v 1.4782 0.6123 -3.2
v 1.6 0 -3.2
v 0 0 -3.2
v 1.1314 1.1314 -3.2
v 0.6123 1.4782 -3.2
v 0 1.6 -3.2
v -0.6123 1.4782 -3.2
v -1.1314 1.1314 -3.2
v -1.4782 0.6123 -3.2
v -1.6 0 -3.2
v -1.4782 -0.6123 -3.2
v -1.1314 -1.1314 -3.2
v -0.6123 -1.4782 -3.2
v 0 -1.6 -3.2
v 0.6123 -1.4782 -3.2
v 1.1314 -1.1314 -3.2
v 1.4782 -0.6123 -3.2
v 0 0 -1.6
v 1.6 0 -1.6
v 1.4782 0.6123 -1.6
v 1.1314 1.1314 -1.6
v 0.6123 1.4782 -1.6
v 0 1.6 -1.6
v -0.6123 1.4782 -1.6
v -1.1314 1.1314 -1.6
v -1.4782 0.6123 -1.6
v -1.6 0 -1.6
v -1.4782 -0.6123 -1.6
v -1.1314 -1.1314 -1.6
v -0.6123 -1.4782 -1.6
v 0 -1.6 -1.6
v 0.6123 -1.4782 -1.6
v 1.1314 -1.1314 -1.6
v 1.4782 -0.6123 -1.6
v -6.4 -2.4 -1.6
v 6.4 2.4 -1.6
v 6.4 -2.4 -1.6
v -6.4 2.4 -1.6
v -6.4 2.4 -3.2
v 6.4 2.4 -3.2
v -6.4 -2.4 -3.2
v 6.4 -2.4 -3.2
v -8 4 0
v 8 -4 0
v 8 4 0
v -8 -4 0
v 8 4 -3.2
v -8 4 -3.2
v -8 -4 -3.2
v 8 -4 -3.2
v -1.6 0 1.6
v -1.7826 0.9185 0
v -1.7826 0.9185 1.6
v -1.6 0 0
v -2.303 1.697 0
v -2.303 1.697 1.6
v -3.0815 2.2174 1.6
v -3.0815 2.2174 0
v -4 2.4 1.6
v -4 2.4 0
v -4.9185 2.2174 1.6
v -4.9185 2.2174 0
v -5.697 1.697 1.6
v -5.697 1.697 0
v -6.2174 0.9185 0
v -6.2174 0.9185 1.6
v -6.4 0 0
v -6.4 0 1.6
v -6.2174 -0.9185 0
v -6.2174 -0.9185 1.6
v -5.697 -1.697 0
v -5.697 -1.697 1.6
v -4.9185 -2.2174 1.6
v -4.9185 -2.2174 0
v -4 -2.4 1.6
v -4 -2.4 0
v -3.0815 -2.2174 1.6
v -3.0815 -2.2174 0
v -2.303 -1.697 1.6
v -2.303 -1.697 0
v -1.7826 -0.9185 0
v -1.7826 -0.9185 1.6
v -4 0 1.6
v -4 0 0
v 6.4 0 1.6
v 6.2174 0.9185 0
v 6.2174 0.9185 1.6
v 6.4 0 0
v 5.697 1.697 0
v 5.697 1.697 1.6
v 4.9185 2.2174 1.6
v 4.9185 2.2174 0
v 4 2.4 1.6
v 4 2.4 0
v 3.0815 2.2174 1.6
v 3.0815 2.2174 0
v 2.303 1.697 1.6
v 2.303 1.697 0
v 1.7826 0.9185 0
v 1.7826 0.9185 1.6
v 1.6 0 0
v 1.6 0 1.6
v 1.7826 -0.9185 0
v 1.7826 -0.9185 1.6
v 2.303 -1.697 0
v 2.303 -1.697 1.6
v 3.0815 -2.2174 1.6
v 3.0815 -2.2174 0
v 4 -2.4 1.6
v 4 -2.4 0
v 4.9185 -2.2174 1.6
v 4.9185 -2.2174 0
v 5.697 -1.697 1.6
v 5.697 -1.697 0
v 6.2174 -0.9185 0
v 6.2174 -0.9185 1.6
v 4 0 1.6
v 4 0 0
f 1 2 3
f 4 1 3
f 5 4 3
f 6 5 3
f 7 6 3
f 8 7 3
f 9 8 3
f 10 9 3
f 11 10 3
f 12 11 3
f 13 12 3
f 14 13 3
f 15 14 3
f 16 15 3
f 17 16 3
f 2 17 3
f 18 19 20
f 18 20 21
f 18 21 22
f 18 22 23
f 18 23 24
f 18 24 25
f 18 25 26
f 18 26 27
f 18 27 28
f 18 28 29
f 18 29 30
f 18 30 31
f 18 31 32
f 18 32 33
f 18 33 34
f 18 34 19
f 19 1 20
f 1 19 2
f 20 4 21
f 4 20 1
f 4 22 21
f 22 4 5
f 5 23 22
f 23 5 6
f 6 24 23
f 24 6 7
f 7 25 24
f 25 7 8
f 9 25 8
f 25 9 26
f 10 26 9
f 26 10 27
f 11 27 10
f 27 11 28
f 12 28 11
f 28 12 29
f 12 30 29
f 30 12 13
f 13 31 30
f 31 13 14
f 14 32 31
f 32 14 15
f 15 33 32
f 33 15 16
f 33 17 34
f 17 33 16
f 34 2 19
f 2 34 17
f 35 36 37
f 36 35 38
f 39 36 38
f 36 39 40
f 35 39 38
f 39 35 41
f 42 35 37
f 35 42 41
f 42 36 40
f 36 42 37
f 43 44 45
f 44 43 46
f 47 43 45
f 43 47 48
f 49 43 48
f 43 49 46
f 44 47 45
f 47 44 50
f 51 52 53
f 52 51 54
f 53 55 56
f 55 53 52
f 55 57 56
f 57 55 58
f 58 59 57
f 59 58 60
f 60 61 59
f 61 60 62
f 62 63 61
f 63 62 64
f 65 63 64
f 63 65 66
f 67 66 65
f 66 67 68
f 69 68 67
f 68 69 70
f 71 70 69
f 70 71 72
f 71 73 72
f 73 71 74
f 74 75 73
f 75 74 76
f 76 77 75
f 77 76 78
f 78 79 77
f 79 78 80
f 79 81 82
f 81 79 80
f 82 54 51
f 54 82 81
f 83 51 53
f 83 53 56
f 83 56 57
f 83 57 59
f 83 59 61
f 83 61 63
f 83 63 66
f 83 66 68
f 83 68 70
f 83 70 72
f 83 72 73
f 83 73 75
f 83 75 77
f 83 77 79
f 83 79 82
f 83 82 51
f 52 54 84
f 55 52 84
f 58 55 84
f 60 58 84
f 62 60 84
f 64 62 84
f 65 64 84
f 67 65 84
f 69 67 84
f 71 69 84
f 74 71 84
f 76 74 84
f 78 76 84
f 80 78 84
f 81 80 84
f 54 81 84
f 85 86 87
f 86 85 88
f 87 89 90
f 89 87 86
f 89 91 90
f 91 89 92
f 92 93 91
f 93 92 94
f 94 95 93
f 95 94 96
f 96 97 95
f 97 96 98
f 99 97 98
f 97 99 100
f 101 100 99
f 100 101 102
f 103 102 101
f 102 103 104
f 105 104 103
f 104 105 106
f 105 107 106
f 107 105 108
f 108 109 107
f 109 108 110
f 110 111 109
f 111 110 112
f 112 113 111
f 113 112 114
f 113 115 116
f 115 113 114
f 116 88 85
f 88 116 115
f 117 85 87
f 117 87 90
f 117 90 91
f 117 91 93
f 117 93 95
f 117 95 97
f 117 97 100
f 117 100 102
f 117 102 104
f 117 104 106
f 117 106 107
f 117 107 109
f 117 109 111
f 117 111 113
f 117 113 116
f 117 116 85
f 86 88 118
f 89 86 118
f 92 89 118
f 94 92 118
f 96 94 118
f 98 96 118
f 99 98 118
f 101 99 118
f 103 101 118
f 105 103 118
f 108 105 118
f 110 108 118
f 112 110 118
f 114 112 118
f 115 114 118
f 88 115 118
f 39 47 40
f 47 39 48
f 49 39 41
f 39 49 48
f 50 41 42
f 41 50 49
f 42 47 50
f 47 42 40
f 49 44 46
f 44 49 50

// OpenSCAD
// file: ../p/stud.scad
use <../lib.scad>
use <4-4cyli.scad>
use <4-4disc.scad>
use <4-4edge.scad>
function ldraw_lib__stud() = [
// 0 Stud
// 0 Name: stud.dat
// 0 Author: James Jessiman
// 0 !LDRAW_ORG Primitive UPDATE 2012-01
// 0 !LICENSE Licensed under CC BY 4.0 : see CAreadme.txt
// 
// 0 BFC CERTIFY CCW
  [0,"BFC","CERTIFY"],
  [0,"BFC","CCW"],
// 
// 0 !HISTORY 2002-04-04 [sbliss] Modified for BFC compliance
// 0 !HISTORY 2002-04-25 [PTadmin] Official Update 2002-02
// 0 !HISTORY 2007-06-24 [PTadmin] Header formatted for Contributor Agreement
// 0 !HISTORY 2008-07-01 [PTadmin] Official Update 2008-01
// 0 !HISTORY 2012-02-16 [Philo] Changed to CCW
// 0 !HISTORY 2012-03-30 [PTadmin] Official Update 2012-01
// 
// 
// 1 16 0 0 0 6 0 0 0 1 0 0 0 6 4-4edge.dat
  [1,16,0,0,0,6,0,0,0,1,0,0,0,6, ldraw_lib__4_4edge()],
// 1 16 0 -4 0 6 0 0 0 1 0 0 0 6 4-4edge.dat
  [1,16,0,-4,0,6,0,0,0,1,0,0,0,6, ldraw_lib__4_4edge()],
// 1 16 0 0 0 6 0 0 0 -4 0 0 0 6 4-4cyli.dat
  [1,16,0,0,0,6,0,0,0,-4,0,0,0,6, ldraw_lib__4_4cyli()],
// 1 16 0 -4 0 6 0 0 0 1 0 0 0 6 4-4disc.dat
  [1,16,0,-4,0,6,0,0,0,1,0,0,0,6, ldraw_lib__4_4disc()],
  [-1,16,0,0,0,6,0,0,0,-1,0,0,0,6, ldraw_lib__4_4disc()],
];
module ldraw_lib__stud(step=0, col=false, unit=2/5, alt=false, line=0.2, solid=!$preview)
    makepoly(ldraw_lib__stud(), step=step, col=col, unit=unit, alt=alt, line=line, solid=solid);
ldraw_lib__stud(line=0.2);
// file: ../p/4-4edge.scad
use <../lib.scad>
function ldraw_lib__4_4edge() = [
// 0 Circle 1.0
// 0 Name: 4-4edge.dat
// 0 Author: James Jessiman
// 0 !LDRAW_ORG Primitive UPDATE 2017-01
// 0 !LICENSE Licensed under CC BY 2.0 and CC BY 4.0 : see CAreadme.txt
// 
// 0 BFC CERTIFY CCW
  [0,"BFC","CERTIFY"],
  [0,"BFC","CCW"],
// 
// 0 !HISTORY 1998-12-15 [PTadmin] Official Update 1998-10
// 0 !HISTORY 2005-12-28 [PTadmin] Official Update 2005-01
// 0 !HISTORY 2007-06-24 [PTadmin] Header formatted for Contributor Agreement
// 0 !HISTORY 2008-07-01 [PTadmin] Official Update 2008-01
// 0 !HISTORY 2017-01-15 [Steffen] BFCed
// 0 !HISTORY 2017-12-30 [PTadmin] Official Update 2017-01
// 
// 
// 2 24 1 0 0 0.9239 0 0.3827
  [2,24,1,0,0,0.9239,0,0.3827],
// 2 24 0.9239 0 0.3827 0.7071 0 0.7071
  [2,24,0.9239,0,0.3827,0.7071,0,0.7071],
// 2 24 0.7071 0 0.7071 0.3827 0 0.9239
  [2,24,0.7071,0,0.7071,0.3827,0,0.9239],
// 2 24 0.3827 0 0.9239 0 0 1
  [2,24,0.3827,0,0.9239,0,0,1],
// 2 24 0 0 1 -0.3827 0 0.9239
  [2,24,0,0,1,-0.3827,0,0.9239],
// 2 24 -0.3827 0 0.9239 -0.7071 0 0.7071
  [2,24,-0.3827,0,0.9239,-0.7071,0,0.7071],
// 2 24 -0.7071 0 0.7071 -0.9239 0 0.3827
  [2,24,-0.7071,0,0.7071,-0.9239,0,0.3827],
// 2 24 -0.9239 0 0.3827 -1 0 -0
  [2,24,-0.9239,0,0.3827,-1,0,-0],
// 2 24 -1 0 -0 -0.9239 0 -0.3827
  [2,24,-1,0,-0,-0.9239,0,-0.3827],
// 2 24 -0.9239 0 -0.3827 -0.7071 0 -0.7071
  [2,24,-0.9239,0,-0.3827,-0.7071,0,-0.7071],
// 2 24 -0.7071 0 -0.7071 -0.3827 0 -0.9239
  [2,24,-0.7071,0,-0.7071,-0.3827,0,-0.9239],
// 2 24 -0.3827 0 -0.9239 0 0 -1
  [2,24,-0.3827,0,-0.9239,0,0,-1],
// 2 24 0 0 -1 0.3827 0 -0.9239
  [2,24,0,0,-1,0.3827,0,-0.9239],
// 2 24 0.3827 0 -0.9239 0.7071 0 -0.7071
  [2,24,0.3827,0,-0.9239,0.7071,0,-0.7071],
// 2 24 0.7071 0 -0.7071 0.9239 0 -0.3827
  [2,24,0.7071,0,-0.7071,0.9239,0,-0.3827],
// 2 24 0.9239 0 -0.3827 1 0 0
  [2,24,0.9239,0,-0.3827,1,0,0],
];
module ldraw_lib__4_4edge(step=0, col=false, unit=2/5, alt=false, line=0.2, solid=!$preview)
    makepoly(ldraw_lib__4_4edge(), step=step, col=col, unit=unit, alt=alt, line=line, solid=solid);
ldraw_lib__4_4edge(line=0.2);
// file: ../p/4-4disc.scad
use <../lib.scad>
function ldraw_lib__4_4disc() = [
// 0 Disc 1.0
// 0 Name: 4-4disc.dat
// 0 Author: James Jessiman
// 0 !LDRAW_ORG Primitive UPDATE 2002-02
// 0 !LICENSE Licensed under CC BY 2.0 and CC BY 4.0 : see CAreadme.txt
// 
// 0 BFC CERTIFY CCW
  [0,"BFC","CERTIFY"],
  [0,"BFC","CCW"],
// 
// 0 !HISTORY 1998-12-15 [PTadmin] Official Update 1998-10
// 0 !HISTORY 2002-03-23 [sbliss] Added BFC statement
// 0 !HISTORY 2002-04-25 [PTadmin] Official Update 2002-02
// 0 !HISTORY 2007-06-24 [PTadmin] Header formatted for Contributor Agreement
// 0 !HISTORY 2008-07-01 [PTadmin] Official Update 2008-01
// 
// 
// 3 16 0 0 0 1 0 0 0.9239 0 0.3827
  [3,16,0,0,0,1,0,0,0.9239,0,0.3827],
// 3 16 0 0 0 0.9239 0 0.3827 0.7071 0 0.7071
  [3,16,0,0,0,0.9239,0,0.3827,0.7071,0,0.7071],
// 3 16 0 0 0 0.7071 0 0.7071 0.3827 0 0.9239
  [3,16,0,0,0,0.7071,0,0.7071,0.3827,0,0.9239],
// 3 16 0 0 0 0.3827 0 0.9239 0 0 1
  [3,16,0,0,0,0.3827,0,0.9239,0,0,1],
// 3 16 0 0 0 0 0 1 -0.3827 0 0.9239
  [3,16,0,0,0,0,0,1,-0.3827,0,0.9239],
// 3 16 0 0 0 -0.3827 0 0.9239 -0.7071 0 0.7071
  [3,16,0,0,0,-0.3827,0,0.9239,-0.7071,0,0.7071],
// 3 16 0 0 0 -0.7071 0 0.7071 -0.9239 0 0.3827
  [3,16,0,0,0,-0.7071,0,0.7071,-0.9239,0,0.3827],
// 3 16 0 0 0 -0.9239 0 0.3827 -1 0 -0
  [3,16,0,0,0,-0.9239,0,0.3827,-1,0,-0],
// 3 16 0 0 0 -1 0 -0 -0.9239 0 -0.3827
  [3,16,0,0,0,-1,0,-0,-0.9239,0,-0.3827],
// 3 16 0 0 0 -0.9239 0 -0.3827 -0.7071 0 -0.7071
  [3,16,0,0,0,-0.9239,0,-0.3827,-0.7071,0,-0.7071],
// 3 16 0 0 0 -0.7071 0 -0.7071 -0.3827 0 -0.9239
  [3,16,0,0,0,-0.7071,0,-0.7071,-0.3827,0,-0.9239],
// 3 16 0 0 0 -0.3827 0 -0.9239 0 0 -1
  [3,16,0,0,0,-0.3827,0,-0.9239,0,0,-1],
// 3 16 0 0 0 0 0 -1 0.3827 0 -0.9239
  [3,16,0,0,0,0,0,-1,0.3827,0,-0.9239],
// 3 16 0 0 0 0.3827 0 -0.9239 0.7071 0 -0.7071
  [3,16,0,0,0,0.3827,0,-0.9239,0.7071,0,-0.7071],
// 3 16 0 0 0 0.7071 0 -0.7071 0.9239 0 -0.3827
  [3,16,0,0,0,0.7071,0,-0.7071,0.9239,0,-0.3827],
// 3 16 0 0 0 0.9239 0 -0.3827 1 0 0
  [3,16,0,0,0,0.9239,0,-0.3827,1,0,0],
// 0
];
module ldraw_lib__4_4disc(step=0, col=false, unit=2/5, alt=false, line=0.2, solid=!$preview)
    makepoly(ldraw_lib__4_4disc(), step=step, col=col, unit=unit, alt=alt, line=line, solid=solid);
ldraw_lib__4_4disc(line=0.2);
// file: ../p/4-4cyli.scad
use <../lib.scad>
$fa=1; $fs=0.2;
function ldraw_lib__4_4cyli(realsolid=false) = [
// 0 Cylinder 1.0
// 0 Name: 4-4cyli.dat
// 0 Author: James Jessiman
// 0 !LDRAW_ORG Primitive UPDATE 2005-01
// 0 !LICENSE Licensed under CC BY 2.0 and CC BY 4.0 : see CAreadme.txt
// 
// 0 BFC CERTIFY CCW
  [0,"BFC","CERTIFY"],
  [0,"BFC","CCW"],
// 
// 0 !HISTORY 1998-12-15 [PTadmin] Official Update 1998-10
// 0 !HISTORY 2002-03-23 [sbliss] Added BFC statement; merged headers from files in distributions LDraw 0.27 and Complete.
// 0 !HISTORY 2002-04-25 [PTadmin] Official Update 2002-02
// 0 !HISTORY 2004-12-14 [guyvivan] BFC CCW
// 0 !HISTORY 2005-12-28 [PTadmin] Official Update 2005-01
// 0 !HISTORY 2007-06-24 [PTadmin] Header formatted for Contributor Agreement
// 0 !HISTORY 2008-07-01 [PTadmin] Official Update 2008-01
// 
// 
// 4 16 1 1 0 0.9239 1 0.3827 0.9239 0 0.3827 1 0 0
  [4,16,1,1,0,0.9239,1,0.3827,0.9239,0,0.3827,1,0,0],
// 5 24 1 0 0 1 1 0 0.9239 0 0.3827 0.9239 0 -0.3827
  [5,24,1,0,0,1,1,0,0.9239,0,0.3827,0.9239,0,-0.3827],
// 4 16 0.9239 1 0.3827 0.7071 1 0.7071 0.7071 0 0.7071 0.9239 0 0.3827
  [4,16,0.9239,1,0.3827,0.7071,1,0.7071,0.7071,0,0.7071,0.9239,0,0.3827],
// 5 24 0.9239 0 0.3827 0.9239 1 0.3827 0.7071 0 0.7071 1 0 0
  [5,24,0.9239,0,0.3827,0.9239,1,0.3827,0.7071,0,0.7071,1,0,0],
// 4 16 0.7071 1 0.7071 0.3827 1 0.9239 0.3827 0 0.9239 0.7071 0 0.7071
  [4,16,0.7071,1,0.7071,0.3827,1,0.9239,0.3827,0,0.9239,0.7071,0,0.7071],
// 5 24 0.7071 0 0.7071 0.7071 1 0.7071 0.3827 0 0.9239 0.9239 0 0.3827
  [5,24,0.7071,0,0.7071,0.7071,1,0.7071,0.3827,0,0.9239,0.9239,0,0.3827],
// 4 16 0.3827 1 0.9239 0 1 1 0 0 1 0.3827 0 0.9239
  [4,16,0.3827,1,0.9239,0,1,1,0,0,1,0.3827,0,0.9239],
// 5 24 0.3827 0 0.9239 0.3827 1 0.9239 0 0 1 0.7071 0 0.7071
  [5,24,0.3827,0,0.9239,0.3827,1,0.9239,0,0,1,0.7071,0,0.7071],
// 4 16 0 1 1 -0.3827 1 0.9239 -0.3827 0 0.9239 0 0 1
  [4,16,0,1,1,-0.3827,1,0.9239,-0.3827,0,0.9239,0,0,1],
// 5 24 0 0 1 0 1 1 -0.3827 0 0.9239 0.3827 0 0.9239
  [5,24,0,0,1,0,1,1,-0.3827,0,0.9239,0.3827,0,0.9239],
// 4 16 -0.3827 1 0.9239 -0.7071 1 0.7071 -0.7071 0 0.7071 -0.3827 0 0.9239
  [4,16,-0.3827,1,0.9239,-0.7071,1,0.7071,-0.7071,0,0.7071,-0.3827,0,0.9239],
// 5 24 -0.3827 0 0.9239 -0.3827 1 0.9239 -0.7071 0 0.7071 0 0 1
  [5,24,-0.3827,0,0.9239,-0.3827,1,0.9239,-0.7071,0,0.7071,0,0,1],
// 4 16 -0.7071 1 0.7071 -0.9239 1 0.3827 -0.9239 0 0.3827 -0.7071 0 0.7071
  [4,16,-0.7071,1,0.7071,-0.9239,1,0.3827,-0.9239,0,0.3827,-0.7071,0,0.7071],
// 5 24 -0.7071 0 0.7071 -0.7071 1 0.7071 -0.9239 0 0.3827 -0.3827 0 0.9239
  [5,24,-0.7071,0,0.7071,-0.7071,1,0.7071,-0.9239,0,0.3827,-0.3827,0,0.9239],
// 4 16 -0.9239 1 0.3827 -1 1 0 -1 0 0 -0.9239 0 0.3827
  [4,16,-0.9239,1,0.3827,-1,1,0,-1,0,0,-0.9239,0,0.3827],
// 5 24 -0.9239 0 0.3827 -0.9239 1 0.3827 -1 0 0 -0.7071 0 0.7071
  [5,24,-0.9239,0,0.3827,-0.9239,1,0.3827,-1,0,0,-0.7071,0,0.7071],
// 4 16 -1 1 0 -0.9239 1 -0.3827 -0.9239 0 -0.3827 -1 0 0
  [4,16,-1,1,0,-0.9239,1,-0.3827,-0.9239,0,-0.3827,-1,0,0],
// 5 24 -1 0 0 -1 1 0 -0.9239 0 -0.3827 -0.9239 0 0.3827
  [5,24,-1,0,0,-1,1,0,-0.9239,0,-0.3827,-0.9239,0,0.3827],
// 4 16 -0.9239 1 -0.3827 -0.7071 1 -0.7071 -0.7071 0 -0.7071 -0.9239 0 -0.3827
  [4,16,-0.9239,1,-0.3827,-0.7071,1,-0.7071,-0.7071,0,-0.7071,-0.9239,0,-0.3827],
// 5 24 -0.9239 0 -0.3827 -0.9239 1 -0.3827 -0.7071 0 -0.7071 -1 0 0
  [5,24,-0.9239,0,-0.3827,-0.9239,1,-0.3827,-0.7071,0,-0.7071,-1,0,0],
// 4 16 -0.7071 1 -0.7071 -0.3827 1 -0.9239 -0.3827 0 -0.9239 -0.7071 0 -0.7071
  [4,16,-0.7071,1,-0.7071,-0.3827,1,-0.9239,-0.3827,0,-0.9239,-0.7071,0,-0.7071],
// 5 24 -0.7071 0 -0.7071 -0.7071 1 -0.7071 -0.3827 0 -0.9239 -0.9239 0 -0.3827
  [5,24,-0.7071,0,-0.7071,-0.7071,1,-0.7071,-0.3827,0,-0.9239,-0.9239,0,-0.3827],
// 4 16 -0.3827 1 -0.9239 0 1 -1 0 0 -1 -0.3827 0 -0.9239
  [4,16,-0.3827,1,-0.9239,0,1,-1,0,0,-1,-0.3827,0,-0.9239],
// 5 24 -0.3827 0 -0.9239 -0.3827 1 -0.9239 0 0 -1 -0.7071 0 -0.7071
  [5,24,-0.3827,0,-0.9239,-0.3827,1,-0.9239,0,0,-1,-0.7071,0,-0.7071],
// 4 16 0 1 -1 0.3827 1 -0.9239 0.3827 0 -0.9239 0 0 -1
  [4,16,0,1,-1,0.3827,1,-0.9239,0.3827,0,-0.9239,0,0,-1],
// 5 24 0 0 -1 0 1 -1 0.3827 0 -0.9239 -0.3827 0 -0.9239
  [5,24,0,0,-1,0,1,-1,0.3827,0,-0.9239,-0.3827,0,-0.9239],
// 4 16 0.3827 1 -0.9239 0.7071 1 -0.7071 0.7071 0 -0.7071 0.3827 0 -0.9239
  [4,16,0.3827,1,-0.9239,0.7071,1,-0.7071,0.7071,0,-0.7071,0.3827,0,-0.9239],
// 5 24 0.3827 0 -0.9239 0.3827 1 -0.9239 0.7071 0 -0.7071 0 0 -1
  [5,24,0.3827,0,-0.9239,0.3827,1,-0.9239,0.7071,0,-0.7071,0,0,-1],
// 4 16 0.7071 1 -0.7071 0.9239 1 -0.3827 0.9239 0 -0.3827 0.7071 0 -0.7071
  [4,16,0.7071,1,-0.7071,0.9239,1,-0.3827,0.9239,0,-0.3827,0.7071,0,-0.7071],
// 5 24 0.7071 0 -0.7071 0.7071 1 -0.7071 0.9239 0 -0.3827 0.3827 0 -0.9239
  [5,24,0.7071,0,-0.7071,0.7071,1,-0.7071,0.9239,0,-0.3827,0.3827,0,-0.9239],
// 4 16 0.9239 1 -0.3827 1 1 0 1 0 0 0.9239 0 -0.3827
  [4,16,0.9239,1,-0.3827,1,1,0,1,0,0,0.9239,0,-0.3827],
// 5 24 0.9239 0 -0.3827 0.9239 1 -0.3827 1 0 0 0.7071 0 -0.7071
  [5,24,0.9239,0,-0.3827,0.9239,1,-0.3827,1,0,0,0.7071,0,-0.7071],
// 0
];
module ldraw_lib__4_4cyli(step=0, col=false, unit=2/5, alt=false, line=0.2, solid=!$preview)
    makepoly(ldraw_lib__4_4cyli(solid), step=step, col=col, unit=unit, alt=alt, line=line, solid=solid);
ldraw_lib__4_4cyli(line=0.2);
// file: ../p/stug-1x2.scad
use <../lib.scad>
use <stud.scad>
$fa=1; $fs=0.2;
function ldraw_lib__stug_1x2(realsolid=false) = [
// 0 Stud Group  1 x  2
// 0 Name: stug-1x2.dat
// 0 Author: Steffen [Steffen]
// 0 !LDRAW_ORG Primitive UPDATE 2011-01
// 0 !LICENSE Licensed under CC BY 2.0 and CC BY 4.0 : see CAreadme.txt
// 
// 0 BFC CERTIFY CCW
  [0,"BFC","CERTIFY"],
  [0,"BFC","CCW"],
// 
// 0 !HISTORY 2011-07-25 [PTadmin] Official Update 2011-01
// 
// 
// 1 16 -10 0 0 1 0 0 0 1 0 0 0 1 stud.dat
  [1,16,-10,0,0,1,0,0,0,1,0,0,0,1, ldraw_lib__stud(realsolid)],
// 1 16 10 0 0 1 0 0 0 1 0 0 0 1 stud.dat
  [1,16,10,0,0,1,0,0,0,1,0,0,0,1, ldraw_lib__stud(realsolid)],
];
module ldraw_lib__stug_1x2(step=0, col=false, unit=2/5, alt=false, line=0.2, solid=!$preview)
    makepoly(ldraw_lib__stug_1x2(solid), step=step, col=col, unit=unit, alt=alt, line=line, solid=solid);
ldraw_lib__stug_1x2(line=0.2);
// file: ../p/stud3.scad
use <../lib.scad>
use <4-4cyli.scad>
use <4-4disc.scad>
use <4-4edge.scad>
function ldraw_lib__stud3() = [
// 0 Stud Tube Solid
// 0 Name: stud3.dat
// 0 Author: James Jessiman
// 0 !LDRAW_ORG Primitive UPDATE 2012-01
// 0 !LICENSE Licensed under CC BY 4.0 : see CAreadme.txt
// 
// 0 BFC CERTIFY CCW
  [0,"BFC","CERTIFY"],
  [0,"BFC","CCW"],
// 
// 0 !HISTORY 2002-04-04 [sbliss] Modified for BFC compliance
// 0 !HISTORY 2002-04-25 [PTadmin] Official Update 2002-02
// 0 !HISTORY 2007-06-24 [PTadmin] Header formatted for Contributor Agreement
// 0 !HISTORY 2008-07-01 [PTadmin] Official Update 2008-01
// 0 !HISTORY 2012-02-16 [Philo] Changed to CCW
// 0 !HISTORY 2012-03-30 [PTadmin] Official Update 2012-01
// 
// 
// 1 16 0 -4 0 4 0 0 0 1 0 0 0 4 4-4edge.dat
  [1,16,0,-4,0,4,0,0,0,1,0,0,0,4, ldraw_lib__4_4edge()],
// 1 16 0 0 0 4 0 0 0 1 0 0 0 4 4-4edge.dat
  [1,16,0,0,0,4,0,0,0,1,0,0,0,4, ldraw_lib__4_4edge()],
// 1 16 0 -4 0 4 0 0 0 1 0 0 0 4 4-4disc.dat
  [1,16,0,-4,0,4,0,0,0,1,0,0,0,4, ldraw_lib__4_4disc()],
  [-1,16,0,0,0,4,0,0,0,-1,0,0,0,4, ldraw_lib__4_4disc()],
// 1 16 0 -4 0 4 0 0 0 4 0 0 0 4 4-4cyli.dat
  [1,16,0,-4,0,4,0,0,0,4,0,0,0,4, ldraw_lib__4_4cyli()],
];
module ldraw_lib__stud3(step=0, col=false, unit=2/5, alt=false, line=0.2, solid=!$preview)
    makepoly(ldraw_lib__stud3(), step=step, col=col, unit=unit, alt=alt, line=line, solid=solid);
ldraw_lib__stud3(line=0.2);
// file: ../p/box5.scad
use <../lib.scad>
function ldraw_lib__box5() = [
// 0 Box with 5 Faces and All Edges
// 0 Name: box5.dat
// 0 Author: James Jessiman
// 0 !LDRAW_ORG Primitive UPDATE 2012-01
// 0 !LICENSE Licensed under CC BY 2.0 and CC BY 4.0 : see CAreadme.txt
// 
// 0 BFC CERTIFY CCW
  [0,"BFC","CERTIFY"],
  [0,"BFC","CCW"],
// 
// 0 !HISTORY 2002-04-03 [sbliss] Modified for BFC compliance
// 0 !HISTORY 2002-04-25 [PTadmin] Official Update 2002-02
// 0 !HISTORY 2007-06-24 [PTadmin] Header formatted for Contributor Agreement
// 0 !HISTORY 2008-07-01 [PTadmin] Official Update 2008-01
// 0 !HISTORY 2012-02-16 [Philo] Changed to CCW
// 0 !HISTORY 2012-03-30 [PTadmin] Official Update 2012-01
// 
// 
// 2 24 1 1 1 -1 1 1
  [2,24,1,1,1,-1,1,1],
// 2 24 -1 1 1 -1 1 -1
  [2,24,-1,1,1,-1,1,-1],
// 2 24 -1 1 -1 1 1 -1
  [2,24,-1,1,-1,1,1,-1],
// 2 24 1 1 -1 1 1 1
  [2,24,1,1,-1,1,1,1],
// 2 24 1 0 1 -1 0 1
  [2,24,1,0,1,-1,0,1],
// 2 24 -1 0 1 -1 0 -1
  [2,24,-1,0,1,-1,0,-1],
// 2 24 -1 0 -1 1 0 -1
  [2,24,-1,0,-1,1,0,-1],
// 2 24 1 0 -1 1 0 1
  [2,24,1,0,-1,1,0,1],
// 2 24 1 0 1 1 1 1
  [2,24,1,0,1,1,1,1],
// 2 24 -1 0 1 -1 1 1
  [2,24,-1,0,1,-1,1,1],
// 2 24 1 0 -1 1 1 -1
  [2,24,1,0,-1,1,1,-1],
// 2 24 -1 0 -1 -1 1 -1
  [2,24,-1,0,-1,-1,1,-1],
// 4 16 -1 1 1 1 1 1 1 1 -1 -1 1 -1
  [4,16,-1,1,1,1,1,1,1,1,-1,-1,1,-1],
// 4 16 -1 1 1 -1 0 1 1 0 1 1 1 1
  [4,16,-1,1,1,-1,0,1,1,0,1,1,1,1],
// 4 16 -1 1 -1 -1 0 -1 -1 0 1 -1 1 1
  [4,16,-1,1,-1,-1,0,-1,-1,0,1,-1,1,1],
// 4 16 1 1 -1 1 0 -1 -1 0 -1 -1 1 -1
  [4,16,1,1,-1,1,0,-1,-1,0,-1,-1,1,-1],
// 4 16 1 1 1 1 0 1 1 0 -1 1 1 -1
  [4,16,1,1,1,1,0,1,1,0,-1,1,1,-1],
];
makepoly(ldraw_lib__box5(), line=0.2);
// file: ../p/box4t.scad
use <../lib.scad>
function ldraw_lib__box4t() = [
// 0 Box with 4 Adjacent Faces and All Edges
// 0 Name: box4t.dat
// 0 Author: Tore Eriksson [Tore_Eriksson]
// 0 !LDRAW_ORG Primitive UPDATE 2003-02
// 0 !LICENSE Licensed under CC BY 2.0 and CC BY 4.0 : see CAreadme.txt
// 
// 0 BFC CERTIFY CCW
  [0,"BFC","CERTIFY"],
  [0,"BFC","CCW"],
// 
// 0 !HISTORY 1997-09-29 [PTadmin] Official Update 1997-15
// 0 !HISTORY 2002-08-31 [izanette] Modified with WINDZ for BFC compliance
// 0 !HISTORY 2003-08-01 [PTadmin] Official Update 2003-02
// 0 !HISTORY 2007-06-24 [PTadmin] Header formatted for Contributor Agreement
// 0 !HISTORY 2008-07-01 [PTadmin] Official Update 2008-01
// 
// 
// 2 24 1 1 1 -1 1 1
  [2,24,1,1,1,-1,1,1],
// 2 24 -1 1 1 -1 1 -1
  [2,24,-1,1,1,-1,1,-1],
// 2 24 -1 1 -1 1 1 -1
  [2,24,-1,1,-1,1,1,-1],
// 2 24 1 1 -1 1 1 1
  [2,24,1,1,-1,1,1,1],
// 2 24 1 0 1 -1 0 1
  [2,24,1,0,1,-1,0,1],
// 2 24 -1 0 1 -1 0 -1
  [2,24,-1,0,1,-1,0,-1],
// 2 24 -1 0 -1 1 0 -1
  [2,24,-1,0,-1,1,0,-1],
// 2 24 1 0 -1 1 0 1
  [2,24,1,0,-1,1,0,1],
// 2 24 1 0 1 1 1 1
  [2,24,1,0,1,1,1,1],
// 2 24 -1 0 1 -1 1 1
  [2,24,-1,0,1,-1,1,1],
// 2 24 1 0 -1 1 1 -1
  [2,24,1,0,-1,1,1,-1],
// 2 24 -1 0 -1 -1 1 -1
  [2,24,-1,0,-1,-1,1,-1],
// 4 16 1 1 1 1 1 -1 -1 1 -1 -1 1 1
  [4,16,1,1,1,1,1,-1,-1,1,-1,-1,1,1],
// 4 16 1 1 1 -1 1 1 -1 0 1 1 0 1
  [4,16,1,1,1,-1,1,1,-1,0,1,1,0,1],
// 4 16 -1 1 1 -1 1 -1 -1 0 -1 -1 0 1
  [4,16,-1,1,1,-1,1,-1,-1,0,-1,-1,0,1],
// 0 4 16 -1 1 -1 -1 0 -1 1 0 -1 1 1 -1
// 4 16 1 1 -1 1 1 1 1 0 1 1 0 -1
  [4,16,1,1,-1,1,1,1,1,0,1,1,0,-1],
// 0
];
makepoly(ldraw_lib__box4t(), line=0.2);
// file: s/3023bs01.scad
use <../../lib.scad>
use <../../p/box4t.scad>
use <../../p/box5.scad>
use <../../p/stud3.scad>
use <../../p/stug-1x2.scad>
function ldraw_lib__s__3023bs01() = [
// 0 ~Plate  1 x  2 without Front Face
// 0 Name: s\3023bs01.dat
// 0 Author: Massimo Maso [Sirio]
// 0 !LDRAW_ORG Subpart UPDATE 2023-03
// 0 !LICENSE Licensed under CC BY 4.0 : see CAreadme.txt
// 
// 0 BFC CERTIFY CCW
  [0,"BFC","CERTIFY"],
  [0,"BFC","CCW"],
// 
// 0 !HISTORY 2022-01-14 [PTadmin] Official Update 2022-01
// 0 !HISTORY 2023-05-27 [OrionP] Moved from s\3023s01.dat
// 0 !HISTORY 2023-06-24 [OrionP] Official Update 2023-03
// 
// 
// 0 // Primitves
// 1 16 0 4 0 1 0 0 0 -1 0 0 0 1 stud3.dat
  [1,16,0,4,0,1,0,0,0,-1,0,0,0,1, ldraw_lib__stud3()],
// 0 BFC INVERTNEXT
  [0,"BFC","INVERTNEXT"],
// 1 16 0 8 0 16 0 0 0 -4 0 0 0 6 box5.dat
  [1,16,0,8,0,16,0,0,0,-4,0,0,0,6, ldraw_lib__box5()],
// 1 16 0 8 0 20 0 0 0 -8 0 0 0 10 box4t.dat
  [1,16,0,8,0,20,0,0,0,-8,0,0,0,10, ldraw_lib__box4t()],
// 1 16 0 0 0 1 0 0 0 1 0 0 0 1 stug-1x2.dat
  [1,16,0,0,0,1,0,0,0,1,0,0,0,1, ldraw_lib__stug_1x2()],
// 0 // Faces
// 4 16 20 8 10 16 8 6 -16 8 6 -20 8 10
  [4,16,20,8,10,16,8,6,-16,8,6,-20,8,10],
// 4 16 -20 8 10 -16 8 6 -16 8 -6 -20 8 -10
  [4,16,-20,8,10,-16,8,6,-16,8,-6,-20,8,-10],
// 4 16 -20 8 -10 -16 8 -6 16 8 -6 20 8 -10
  [4,16,-20,8,-10,-16,8,-6,16,8,-6,20,8,-10],
// 4 16 20 8 -10 16 8 -6 16 8 6 20 8 10
  [4,16,20,8,-10,16,8,-6,16,8,6,20,8,10],
];
module ldraw_lib__s__3023bs01(step=0, col=false, unit=2/5, alt=false, line=0.2, solid=!$preview)
    makepoly(ldraw_lib__s__3023bs01(), step=step, col=col, unit=unit, alt=alt, line=line, solid=solid);
ldraw_lib__s__3023bs01(line=0.2);
// file: 3023b.scad
use <../lib.scad>
use <s/3023bs01.scad>
function ldraw_lib__3023b() = [
// 0 Plate  1 x  2
// 0 Name: 3023b.dat
// 0 Author: James Jessiman
// 0 !LDRAW_ORG Part UPDATE 2023-03
// 0 !LICENSE Licensed under CC BY 4.0 : see CAreadme.txt
// 
// 0 BFC CERTIFY CCW
  [0,"BFC","CERTIFY"],
  [0,"BFC","CCW"],
// 
// 0 !KEYWORDS BrickLink 3023, Rebrickable 3023
// 
// 0 !HISTORY 2001-10-26 [PTadmin] Official Update 2001-01
// 0 !HISTORY 2002-05-07 {unknown} BFC Certification
// 0 !HISTORY 2002-06-11 [PTadmin] Official Update 2002-03
// 0 !HISTORY 2007-06-07 [PTadmin] Header formatted for Contributor Agreement
// 0 !HISTORY 2008-07-01 [PTadmin] Official Update 2008-01
// 0 !HISTORY 2020-03-07 [Sirio] Subparted
// 0 !HISTORY 2022-01-14 [PTadmin] Official Update 2022-01
// 0 !HISTORY 2023-05-26 [OrionP] Moved from 3023.dat
// 0 !HISTORY 2023-06-24 [OrionP] Official Update 2023-03
// 
// 
// 1 16 0 0 0 1 0 0 0 1 0 0 0 1 s\3023bs01.dat
  [1,16,0,0,0,1,0,0,0,1,0,0,0,1, ldraw_lib__s__3023bs01()],
// 4 16 -20 0 -10 -20 8 -10 20 8 -10 20 0 -10
  [4,16,-20,0,-10,-20,8,-10,20,8,-10,20,0,-10],
];
module ldraw_lib__3023b(step=0, col=false, unit=2/5, alt=false, line=0.2, solid=!$preview)
    makepoly(ldraw_lib__3023b(), step=step, col=col, unit=unit, alt=alt, line=line, solid=solid);
ldraw_lib__3023b(line=0.2);
// main file
use <../lib.scad>
use <3023b.scad>
function ldraw_lib__6225() = [
// 0 =Plate  1 x  2
// 0 Name: 6225.dat
// 0 Author: Rolf Osterthun [Rolf]
// 0 !LDRAW_ORG Part Alias UPDATE 2025-02
// 0 !LICENSE Licensed under CC BY 4.0 : see CAreadme.txt
// 
// 0 BFC CERTIFY CCW
  [0,"BFC","CERTIFY"],
  [0,"BFC","CCW"],
// 
// 0 !HISTORY 2013-12-23 [PTadmin] Official Update 2013-02
// 0 !HISTORY 2025-01-26 [OrionP] Update 3023 reference
// 0 !HISTORY 2025-02-27 [OrionP] Official Update 2025-02
// 
// 0 // Alias of 3023
// 0 // Part 6225 is the transparent counterpart of 3023b
// 
// 1 16 0 0 0 1 0 0 0 1 0 0 0 1 3023b.dat
  [1,16,0,0,0,1,0,0,0,1,0,0,0,1, ldraw_lib__3023b()],
];
module ldraw_lib__6225(step=0, col=false, unit=2/5, alt=false, line=0.2, solid=!$preview)
    makepoly(ldraw_lib__6225(), step=step, col=col, unit=unit, alt=alt, line=line, solid=solid);
ldraw_lib__6225(line=0.2);
